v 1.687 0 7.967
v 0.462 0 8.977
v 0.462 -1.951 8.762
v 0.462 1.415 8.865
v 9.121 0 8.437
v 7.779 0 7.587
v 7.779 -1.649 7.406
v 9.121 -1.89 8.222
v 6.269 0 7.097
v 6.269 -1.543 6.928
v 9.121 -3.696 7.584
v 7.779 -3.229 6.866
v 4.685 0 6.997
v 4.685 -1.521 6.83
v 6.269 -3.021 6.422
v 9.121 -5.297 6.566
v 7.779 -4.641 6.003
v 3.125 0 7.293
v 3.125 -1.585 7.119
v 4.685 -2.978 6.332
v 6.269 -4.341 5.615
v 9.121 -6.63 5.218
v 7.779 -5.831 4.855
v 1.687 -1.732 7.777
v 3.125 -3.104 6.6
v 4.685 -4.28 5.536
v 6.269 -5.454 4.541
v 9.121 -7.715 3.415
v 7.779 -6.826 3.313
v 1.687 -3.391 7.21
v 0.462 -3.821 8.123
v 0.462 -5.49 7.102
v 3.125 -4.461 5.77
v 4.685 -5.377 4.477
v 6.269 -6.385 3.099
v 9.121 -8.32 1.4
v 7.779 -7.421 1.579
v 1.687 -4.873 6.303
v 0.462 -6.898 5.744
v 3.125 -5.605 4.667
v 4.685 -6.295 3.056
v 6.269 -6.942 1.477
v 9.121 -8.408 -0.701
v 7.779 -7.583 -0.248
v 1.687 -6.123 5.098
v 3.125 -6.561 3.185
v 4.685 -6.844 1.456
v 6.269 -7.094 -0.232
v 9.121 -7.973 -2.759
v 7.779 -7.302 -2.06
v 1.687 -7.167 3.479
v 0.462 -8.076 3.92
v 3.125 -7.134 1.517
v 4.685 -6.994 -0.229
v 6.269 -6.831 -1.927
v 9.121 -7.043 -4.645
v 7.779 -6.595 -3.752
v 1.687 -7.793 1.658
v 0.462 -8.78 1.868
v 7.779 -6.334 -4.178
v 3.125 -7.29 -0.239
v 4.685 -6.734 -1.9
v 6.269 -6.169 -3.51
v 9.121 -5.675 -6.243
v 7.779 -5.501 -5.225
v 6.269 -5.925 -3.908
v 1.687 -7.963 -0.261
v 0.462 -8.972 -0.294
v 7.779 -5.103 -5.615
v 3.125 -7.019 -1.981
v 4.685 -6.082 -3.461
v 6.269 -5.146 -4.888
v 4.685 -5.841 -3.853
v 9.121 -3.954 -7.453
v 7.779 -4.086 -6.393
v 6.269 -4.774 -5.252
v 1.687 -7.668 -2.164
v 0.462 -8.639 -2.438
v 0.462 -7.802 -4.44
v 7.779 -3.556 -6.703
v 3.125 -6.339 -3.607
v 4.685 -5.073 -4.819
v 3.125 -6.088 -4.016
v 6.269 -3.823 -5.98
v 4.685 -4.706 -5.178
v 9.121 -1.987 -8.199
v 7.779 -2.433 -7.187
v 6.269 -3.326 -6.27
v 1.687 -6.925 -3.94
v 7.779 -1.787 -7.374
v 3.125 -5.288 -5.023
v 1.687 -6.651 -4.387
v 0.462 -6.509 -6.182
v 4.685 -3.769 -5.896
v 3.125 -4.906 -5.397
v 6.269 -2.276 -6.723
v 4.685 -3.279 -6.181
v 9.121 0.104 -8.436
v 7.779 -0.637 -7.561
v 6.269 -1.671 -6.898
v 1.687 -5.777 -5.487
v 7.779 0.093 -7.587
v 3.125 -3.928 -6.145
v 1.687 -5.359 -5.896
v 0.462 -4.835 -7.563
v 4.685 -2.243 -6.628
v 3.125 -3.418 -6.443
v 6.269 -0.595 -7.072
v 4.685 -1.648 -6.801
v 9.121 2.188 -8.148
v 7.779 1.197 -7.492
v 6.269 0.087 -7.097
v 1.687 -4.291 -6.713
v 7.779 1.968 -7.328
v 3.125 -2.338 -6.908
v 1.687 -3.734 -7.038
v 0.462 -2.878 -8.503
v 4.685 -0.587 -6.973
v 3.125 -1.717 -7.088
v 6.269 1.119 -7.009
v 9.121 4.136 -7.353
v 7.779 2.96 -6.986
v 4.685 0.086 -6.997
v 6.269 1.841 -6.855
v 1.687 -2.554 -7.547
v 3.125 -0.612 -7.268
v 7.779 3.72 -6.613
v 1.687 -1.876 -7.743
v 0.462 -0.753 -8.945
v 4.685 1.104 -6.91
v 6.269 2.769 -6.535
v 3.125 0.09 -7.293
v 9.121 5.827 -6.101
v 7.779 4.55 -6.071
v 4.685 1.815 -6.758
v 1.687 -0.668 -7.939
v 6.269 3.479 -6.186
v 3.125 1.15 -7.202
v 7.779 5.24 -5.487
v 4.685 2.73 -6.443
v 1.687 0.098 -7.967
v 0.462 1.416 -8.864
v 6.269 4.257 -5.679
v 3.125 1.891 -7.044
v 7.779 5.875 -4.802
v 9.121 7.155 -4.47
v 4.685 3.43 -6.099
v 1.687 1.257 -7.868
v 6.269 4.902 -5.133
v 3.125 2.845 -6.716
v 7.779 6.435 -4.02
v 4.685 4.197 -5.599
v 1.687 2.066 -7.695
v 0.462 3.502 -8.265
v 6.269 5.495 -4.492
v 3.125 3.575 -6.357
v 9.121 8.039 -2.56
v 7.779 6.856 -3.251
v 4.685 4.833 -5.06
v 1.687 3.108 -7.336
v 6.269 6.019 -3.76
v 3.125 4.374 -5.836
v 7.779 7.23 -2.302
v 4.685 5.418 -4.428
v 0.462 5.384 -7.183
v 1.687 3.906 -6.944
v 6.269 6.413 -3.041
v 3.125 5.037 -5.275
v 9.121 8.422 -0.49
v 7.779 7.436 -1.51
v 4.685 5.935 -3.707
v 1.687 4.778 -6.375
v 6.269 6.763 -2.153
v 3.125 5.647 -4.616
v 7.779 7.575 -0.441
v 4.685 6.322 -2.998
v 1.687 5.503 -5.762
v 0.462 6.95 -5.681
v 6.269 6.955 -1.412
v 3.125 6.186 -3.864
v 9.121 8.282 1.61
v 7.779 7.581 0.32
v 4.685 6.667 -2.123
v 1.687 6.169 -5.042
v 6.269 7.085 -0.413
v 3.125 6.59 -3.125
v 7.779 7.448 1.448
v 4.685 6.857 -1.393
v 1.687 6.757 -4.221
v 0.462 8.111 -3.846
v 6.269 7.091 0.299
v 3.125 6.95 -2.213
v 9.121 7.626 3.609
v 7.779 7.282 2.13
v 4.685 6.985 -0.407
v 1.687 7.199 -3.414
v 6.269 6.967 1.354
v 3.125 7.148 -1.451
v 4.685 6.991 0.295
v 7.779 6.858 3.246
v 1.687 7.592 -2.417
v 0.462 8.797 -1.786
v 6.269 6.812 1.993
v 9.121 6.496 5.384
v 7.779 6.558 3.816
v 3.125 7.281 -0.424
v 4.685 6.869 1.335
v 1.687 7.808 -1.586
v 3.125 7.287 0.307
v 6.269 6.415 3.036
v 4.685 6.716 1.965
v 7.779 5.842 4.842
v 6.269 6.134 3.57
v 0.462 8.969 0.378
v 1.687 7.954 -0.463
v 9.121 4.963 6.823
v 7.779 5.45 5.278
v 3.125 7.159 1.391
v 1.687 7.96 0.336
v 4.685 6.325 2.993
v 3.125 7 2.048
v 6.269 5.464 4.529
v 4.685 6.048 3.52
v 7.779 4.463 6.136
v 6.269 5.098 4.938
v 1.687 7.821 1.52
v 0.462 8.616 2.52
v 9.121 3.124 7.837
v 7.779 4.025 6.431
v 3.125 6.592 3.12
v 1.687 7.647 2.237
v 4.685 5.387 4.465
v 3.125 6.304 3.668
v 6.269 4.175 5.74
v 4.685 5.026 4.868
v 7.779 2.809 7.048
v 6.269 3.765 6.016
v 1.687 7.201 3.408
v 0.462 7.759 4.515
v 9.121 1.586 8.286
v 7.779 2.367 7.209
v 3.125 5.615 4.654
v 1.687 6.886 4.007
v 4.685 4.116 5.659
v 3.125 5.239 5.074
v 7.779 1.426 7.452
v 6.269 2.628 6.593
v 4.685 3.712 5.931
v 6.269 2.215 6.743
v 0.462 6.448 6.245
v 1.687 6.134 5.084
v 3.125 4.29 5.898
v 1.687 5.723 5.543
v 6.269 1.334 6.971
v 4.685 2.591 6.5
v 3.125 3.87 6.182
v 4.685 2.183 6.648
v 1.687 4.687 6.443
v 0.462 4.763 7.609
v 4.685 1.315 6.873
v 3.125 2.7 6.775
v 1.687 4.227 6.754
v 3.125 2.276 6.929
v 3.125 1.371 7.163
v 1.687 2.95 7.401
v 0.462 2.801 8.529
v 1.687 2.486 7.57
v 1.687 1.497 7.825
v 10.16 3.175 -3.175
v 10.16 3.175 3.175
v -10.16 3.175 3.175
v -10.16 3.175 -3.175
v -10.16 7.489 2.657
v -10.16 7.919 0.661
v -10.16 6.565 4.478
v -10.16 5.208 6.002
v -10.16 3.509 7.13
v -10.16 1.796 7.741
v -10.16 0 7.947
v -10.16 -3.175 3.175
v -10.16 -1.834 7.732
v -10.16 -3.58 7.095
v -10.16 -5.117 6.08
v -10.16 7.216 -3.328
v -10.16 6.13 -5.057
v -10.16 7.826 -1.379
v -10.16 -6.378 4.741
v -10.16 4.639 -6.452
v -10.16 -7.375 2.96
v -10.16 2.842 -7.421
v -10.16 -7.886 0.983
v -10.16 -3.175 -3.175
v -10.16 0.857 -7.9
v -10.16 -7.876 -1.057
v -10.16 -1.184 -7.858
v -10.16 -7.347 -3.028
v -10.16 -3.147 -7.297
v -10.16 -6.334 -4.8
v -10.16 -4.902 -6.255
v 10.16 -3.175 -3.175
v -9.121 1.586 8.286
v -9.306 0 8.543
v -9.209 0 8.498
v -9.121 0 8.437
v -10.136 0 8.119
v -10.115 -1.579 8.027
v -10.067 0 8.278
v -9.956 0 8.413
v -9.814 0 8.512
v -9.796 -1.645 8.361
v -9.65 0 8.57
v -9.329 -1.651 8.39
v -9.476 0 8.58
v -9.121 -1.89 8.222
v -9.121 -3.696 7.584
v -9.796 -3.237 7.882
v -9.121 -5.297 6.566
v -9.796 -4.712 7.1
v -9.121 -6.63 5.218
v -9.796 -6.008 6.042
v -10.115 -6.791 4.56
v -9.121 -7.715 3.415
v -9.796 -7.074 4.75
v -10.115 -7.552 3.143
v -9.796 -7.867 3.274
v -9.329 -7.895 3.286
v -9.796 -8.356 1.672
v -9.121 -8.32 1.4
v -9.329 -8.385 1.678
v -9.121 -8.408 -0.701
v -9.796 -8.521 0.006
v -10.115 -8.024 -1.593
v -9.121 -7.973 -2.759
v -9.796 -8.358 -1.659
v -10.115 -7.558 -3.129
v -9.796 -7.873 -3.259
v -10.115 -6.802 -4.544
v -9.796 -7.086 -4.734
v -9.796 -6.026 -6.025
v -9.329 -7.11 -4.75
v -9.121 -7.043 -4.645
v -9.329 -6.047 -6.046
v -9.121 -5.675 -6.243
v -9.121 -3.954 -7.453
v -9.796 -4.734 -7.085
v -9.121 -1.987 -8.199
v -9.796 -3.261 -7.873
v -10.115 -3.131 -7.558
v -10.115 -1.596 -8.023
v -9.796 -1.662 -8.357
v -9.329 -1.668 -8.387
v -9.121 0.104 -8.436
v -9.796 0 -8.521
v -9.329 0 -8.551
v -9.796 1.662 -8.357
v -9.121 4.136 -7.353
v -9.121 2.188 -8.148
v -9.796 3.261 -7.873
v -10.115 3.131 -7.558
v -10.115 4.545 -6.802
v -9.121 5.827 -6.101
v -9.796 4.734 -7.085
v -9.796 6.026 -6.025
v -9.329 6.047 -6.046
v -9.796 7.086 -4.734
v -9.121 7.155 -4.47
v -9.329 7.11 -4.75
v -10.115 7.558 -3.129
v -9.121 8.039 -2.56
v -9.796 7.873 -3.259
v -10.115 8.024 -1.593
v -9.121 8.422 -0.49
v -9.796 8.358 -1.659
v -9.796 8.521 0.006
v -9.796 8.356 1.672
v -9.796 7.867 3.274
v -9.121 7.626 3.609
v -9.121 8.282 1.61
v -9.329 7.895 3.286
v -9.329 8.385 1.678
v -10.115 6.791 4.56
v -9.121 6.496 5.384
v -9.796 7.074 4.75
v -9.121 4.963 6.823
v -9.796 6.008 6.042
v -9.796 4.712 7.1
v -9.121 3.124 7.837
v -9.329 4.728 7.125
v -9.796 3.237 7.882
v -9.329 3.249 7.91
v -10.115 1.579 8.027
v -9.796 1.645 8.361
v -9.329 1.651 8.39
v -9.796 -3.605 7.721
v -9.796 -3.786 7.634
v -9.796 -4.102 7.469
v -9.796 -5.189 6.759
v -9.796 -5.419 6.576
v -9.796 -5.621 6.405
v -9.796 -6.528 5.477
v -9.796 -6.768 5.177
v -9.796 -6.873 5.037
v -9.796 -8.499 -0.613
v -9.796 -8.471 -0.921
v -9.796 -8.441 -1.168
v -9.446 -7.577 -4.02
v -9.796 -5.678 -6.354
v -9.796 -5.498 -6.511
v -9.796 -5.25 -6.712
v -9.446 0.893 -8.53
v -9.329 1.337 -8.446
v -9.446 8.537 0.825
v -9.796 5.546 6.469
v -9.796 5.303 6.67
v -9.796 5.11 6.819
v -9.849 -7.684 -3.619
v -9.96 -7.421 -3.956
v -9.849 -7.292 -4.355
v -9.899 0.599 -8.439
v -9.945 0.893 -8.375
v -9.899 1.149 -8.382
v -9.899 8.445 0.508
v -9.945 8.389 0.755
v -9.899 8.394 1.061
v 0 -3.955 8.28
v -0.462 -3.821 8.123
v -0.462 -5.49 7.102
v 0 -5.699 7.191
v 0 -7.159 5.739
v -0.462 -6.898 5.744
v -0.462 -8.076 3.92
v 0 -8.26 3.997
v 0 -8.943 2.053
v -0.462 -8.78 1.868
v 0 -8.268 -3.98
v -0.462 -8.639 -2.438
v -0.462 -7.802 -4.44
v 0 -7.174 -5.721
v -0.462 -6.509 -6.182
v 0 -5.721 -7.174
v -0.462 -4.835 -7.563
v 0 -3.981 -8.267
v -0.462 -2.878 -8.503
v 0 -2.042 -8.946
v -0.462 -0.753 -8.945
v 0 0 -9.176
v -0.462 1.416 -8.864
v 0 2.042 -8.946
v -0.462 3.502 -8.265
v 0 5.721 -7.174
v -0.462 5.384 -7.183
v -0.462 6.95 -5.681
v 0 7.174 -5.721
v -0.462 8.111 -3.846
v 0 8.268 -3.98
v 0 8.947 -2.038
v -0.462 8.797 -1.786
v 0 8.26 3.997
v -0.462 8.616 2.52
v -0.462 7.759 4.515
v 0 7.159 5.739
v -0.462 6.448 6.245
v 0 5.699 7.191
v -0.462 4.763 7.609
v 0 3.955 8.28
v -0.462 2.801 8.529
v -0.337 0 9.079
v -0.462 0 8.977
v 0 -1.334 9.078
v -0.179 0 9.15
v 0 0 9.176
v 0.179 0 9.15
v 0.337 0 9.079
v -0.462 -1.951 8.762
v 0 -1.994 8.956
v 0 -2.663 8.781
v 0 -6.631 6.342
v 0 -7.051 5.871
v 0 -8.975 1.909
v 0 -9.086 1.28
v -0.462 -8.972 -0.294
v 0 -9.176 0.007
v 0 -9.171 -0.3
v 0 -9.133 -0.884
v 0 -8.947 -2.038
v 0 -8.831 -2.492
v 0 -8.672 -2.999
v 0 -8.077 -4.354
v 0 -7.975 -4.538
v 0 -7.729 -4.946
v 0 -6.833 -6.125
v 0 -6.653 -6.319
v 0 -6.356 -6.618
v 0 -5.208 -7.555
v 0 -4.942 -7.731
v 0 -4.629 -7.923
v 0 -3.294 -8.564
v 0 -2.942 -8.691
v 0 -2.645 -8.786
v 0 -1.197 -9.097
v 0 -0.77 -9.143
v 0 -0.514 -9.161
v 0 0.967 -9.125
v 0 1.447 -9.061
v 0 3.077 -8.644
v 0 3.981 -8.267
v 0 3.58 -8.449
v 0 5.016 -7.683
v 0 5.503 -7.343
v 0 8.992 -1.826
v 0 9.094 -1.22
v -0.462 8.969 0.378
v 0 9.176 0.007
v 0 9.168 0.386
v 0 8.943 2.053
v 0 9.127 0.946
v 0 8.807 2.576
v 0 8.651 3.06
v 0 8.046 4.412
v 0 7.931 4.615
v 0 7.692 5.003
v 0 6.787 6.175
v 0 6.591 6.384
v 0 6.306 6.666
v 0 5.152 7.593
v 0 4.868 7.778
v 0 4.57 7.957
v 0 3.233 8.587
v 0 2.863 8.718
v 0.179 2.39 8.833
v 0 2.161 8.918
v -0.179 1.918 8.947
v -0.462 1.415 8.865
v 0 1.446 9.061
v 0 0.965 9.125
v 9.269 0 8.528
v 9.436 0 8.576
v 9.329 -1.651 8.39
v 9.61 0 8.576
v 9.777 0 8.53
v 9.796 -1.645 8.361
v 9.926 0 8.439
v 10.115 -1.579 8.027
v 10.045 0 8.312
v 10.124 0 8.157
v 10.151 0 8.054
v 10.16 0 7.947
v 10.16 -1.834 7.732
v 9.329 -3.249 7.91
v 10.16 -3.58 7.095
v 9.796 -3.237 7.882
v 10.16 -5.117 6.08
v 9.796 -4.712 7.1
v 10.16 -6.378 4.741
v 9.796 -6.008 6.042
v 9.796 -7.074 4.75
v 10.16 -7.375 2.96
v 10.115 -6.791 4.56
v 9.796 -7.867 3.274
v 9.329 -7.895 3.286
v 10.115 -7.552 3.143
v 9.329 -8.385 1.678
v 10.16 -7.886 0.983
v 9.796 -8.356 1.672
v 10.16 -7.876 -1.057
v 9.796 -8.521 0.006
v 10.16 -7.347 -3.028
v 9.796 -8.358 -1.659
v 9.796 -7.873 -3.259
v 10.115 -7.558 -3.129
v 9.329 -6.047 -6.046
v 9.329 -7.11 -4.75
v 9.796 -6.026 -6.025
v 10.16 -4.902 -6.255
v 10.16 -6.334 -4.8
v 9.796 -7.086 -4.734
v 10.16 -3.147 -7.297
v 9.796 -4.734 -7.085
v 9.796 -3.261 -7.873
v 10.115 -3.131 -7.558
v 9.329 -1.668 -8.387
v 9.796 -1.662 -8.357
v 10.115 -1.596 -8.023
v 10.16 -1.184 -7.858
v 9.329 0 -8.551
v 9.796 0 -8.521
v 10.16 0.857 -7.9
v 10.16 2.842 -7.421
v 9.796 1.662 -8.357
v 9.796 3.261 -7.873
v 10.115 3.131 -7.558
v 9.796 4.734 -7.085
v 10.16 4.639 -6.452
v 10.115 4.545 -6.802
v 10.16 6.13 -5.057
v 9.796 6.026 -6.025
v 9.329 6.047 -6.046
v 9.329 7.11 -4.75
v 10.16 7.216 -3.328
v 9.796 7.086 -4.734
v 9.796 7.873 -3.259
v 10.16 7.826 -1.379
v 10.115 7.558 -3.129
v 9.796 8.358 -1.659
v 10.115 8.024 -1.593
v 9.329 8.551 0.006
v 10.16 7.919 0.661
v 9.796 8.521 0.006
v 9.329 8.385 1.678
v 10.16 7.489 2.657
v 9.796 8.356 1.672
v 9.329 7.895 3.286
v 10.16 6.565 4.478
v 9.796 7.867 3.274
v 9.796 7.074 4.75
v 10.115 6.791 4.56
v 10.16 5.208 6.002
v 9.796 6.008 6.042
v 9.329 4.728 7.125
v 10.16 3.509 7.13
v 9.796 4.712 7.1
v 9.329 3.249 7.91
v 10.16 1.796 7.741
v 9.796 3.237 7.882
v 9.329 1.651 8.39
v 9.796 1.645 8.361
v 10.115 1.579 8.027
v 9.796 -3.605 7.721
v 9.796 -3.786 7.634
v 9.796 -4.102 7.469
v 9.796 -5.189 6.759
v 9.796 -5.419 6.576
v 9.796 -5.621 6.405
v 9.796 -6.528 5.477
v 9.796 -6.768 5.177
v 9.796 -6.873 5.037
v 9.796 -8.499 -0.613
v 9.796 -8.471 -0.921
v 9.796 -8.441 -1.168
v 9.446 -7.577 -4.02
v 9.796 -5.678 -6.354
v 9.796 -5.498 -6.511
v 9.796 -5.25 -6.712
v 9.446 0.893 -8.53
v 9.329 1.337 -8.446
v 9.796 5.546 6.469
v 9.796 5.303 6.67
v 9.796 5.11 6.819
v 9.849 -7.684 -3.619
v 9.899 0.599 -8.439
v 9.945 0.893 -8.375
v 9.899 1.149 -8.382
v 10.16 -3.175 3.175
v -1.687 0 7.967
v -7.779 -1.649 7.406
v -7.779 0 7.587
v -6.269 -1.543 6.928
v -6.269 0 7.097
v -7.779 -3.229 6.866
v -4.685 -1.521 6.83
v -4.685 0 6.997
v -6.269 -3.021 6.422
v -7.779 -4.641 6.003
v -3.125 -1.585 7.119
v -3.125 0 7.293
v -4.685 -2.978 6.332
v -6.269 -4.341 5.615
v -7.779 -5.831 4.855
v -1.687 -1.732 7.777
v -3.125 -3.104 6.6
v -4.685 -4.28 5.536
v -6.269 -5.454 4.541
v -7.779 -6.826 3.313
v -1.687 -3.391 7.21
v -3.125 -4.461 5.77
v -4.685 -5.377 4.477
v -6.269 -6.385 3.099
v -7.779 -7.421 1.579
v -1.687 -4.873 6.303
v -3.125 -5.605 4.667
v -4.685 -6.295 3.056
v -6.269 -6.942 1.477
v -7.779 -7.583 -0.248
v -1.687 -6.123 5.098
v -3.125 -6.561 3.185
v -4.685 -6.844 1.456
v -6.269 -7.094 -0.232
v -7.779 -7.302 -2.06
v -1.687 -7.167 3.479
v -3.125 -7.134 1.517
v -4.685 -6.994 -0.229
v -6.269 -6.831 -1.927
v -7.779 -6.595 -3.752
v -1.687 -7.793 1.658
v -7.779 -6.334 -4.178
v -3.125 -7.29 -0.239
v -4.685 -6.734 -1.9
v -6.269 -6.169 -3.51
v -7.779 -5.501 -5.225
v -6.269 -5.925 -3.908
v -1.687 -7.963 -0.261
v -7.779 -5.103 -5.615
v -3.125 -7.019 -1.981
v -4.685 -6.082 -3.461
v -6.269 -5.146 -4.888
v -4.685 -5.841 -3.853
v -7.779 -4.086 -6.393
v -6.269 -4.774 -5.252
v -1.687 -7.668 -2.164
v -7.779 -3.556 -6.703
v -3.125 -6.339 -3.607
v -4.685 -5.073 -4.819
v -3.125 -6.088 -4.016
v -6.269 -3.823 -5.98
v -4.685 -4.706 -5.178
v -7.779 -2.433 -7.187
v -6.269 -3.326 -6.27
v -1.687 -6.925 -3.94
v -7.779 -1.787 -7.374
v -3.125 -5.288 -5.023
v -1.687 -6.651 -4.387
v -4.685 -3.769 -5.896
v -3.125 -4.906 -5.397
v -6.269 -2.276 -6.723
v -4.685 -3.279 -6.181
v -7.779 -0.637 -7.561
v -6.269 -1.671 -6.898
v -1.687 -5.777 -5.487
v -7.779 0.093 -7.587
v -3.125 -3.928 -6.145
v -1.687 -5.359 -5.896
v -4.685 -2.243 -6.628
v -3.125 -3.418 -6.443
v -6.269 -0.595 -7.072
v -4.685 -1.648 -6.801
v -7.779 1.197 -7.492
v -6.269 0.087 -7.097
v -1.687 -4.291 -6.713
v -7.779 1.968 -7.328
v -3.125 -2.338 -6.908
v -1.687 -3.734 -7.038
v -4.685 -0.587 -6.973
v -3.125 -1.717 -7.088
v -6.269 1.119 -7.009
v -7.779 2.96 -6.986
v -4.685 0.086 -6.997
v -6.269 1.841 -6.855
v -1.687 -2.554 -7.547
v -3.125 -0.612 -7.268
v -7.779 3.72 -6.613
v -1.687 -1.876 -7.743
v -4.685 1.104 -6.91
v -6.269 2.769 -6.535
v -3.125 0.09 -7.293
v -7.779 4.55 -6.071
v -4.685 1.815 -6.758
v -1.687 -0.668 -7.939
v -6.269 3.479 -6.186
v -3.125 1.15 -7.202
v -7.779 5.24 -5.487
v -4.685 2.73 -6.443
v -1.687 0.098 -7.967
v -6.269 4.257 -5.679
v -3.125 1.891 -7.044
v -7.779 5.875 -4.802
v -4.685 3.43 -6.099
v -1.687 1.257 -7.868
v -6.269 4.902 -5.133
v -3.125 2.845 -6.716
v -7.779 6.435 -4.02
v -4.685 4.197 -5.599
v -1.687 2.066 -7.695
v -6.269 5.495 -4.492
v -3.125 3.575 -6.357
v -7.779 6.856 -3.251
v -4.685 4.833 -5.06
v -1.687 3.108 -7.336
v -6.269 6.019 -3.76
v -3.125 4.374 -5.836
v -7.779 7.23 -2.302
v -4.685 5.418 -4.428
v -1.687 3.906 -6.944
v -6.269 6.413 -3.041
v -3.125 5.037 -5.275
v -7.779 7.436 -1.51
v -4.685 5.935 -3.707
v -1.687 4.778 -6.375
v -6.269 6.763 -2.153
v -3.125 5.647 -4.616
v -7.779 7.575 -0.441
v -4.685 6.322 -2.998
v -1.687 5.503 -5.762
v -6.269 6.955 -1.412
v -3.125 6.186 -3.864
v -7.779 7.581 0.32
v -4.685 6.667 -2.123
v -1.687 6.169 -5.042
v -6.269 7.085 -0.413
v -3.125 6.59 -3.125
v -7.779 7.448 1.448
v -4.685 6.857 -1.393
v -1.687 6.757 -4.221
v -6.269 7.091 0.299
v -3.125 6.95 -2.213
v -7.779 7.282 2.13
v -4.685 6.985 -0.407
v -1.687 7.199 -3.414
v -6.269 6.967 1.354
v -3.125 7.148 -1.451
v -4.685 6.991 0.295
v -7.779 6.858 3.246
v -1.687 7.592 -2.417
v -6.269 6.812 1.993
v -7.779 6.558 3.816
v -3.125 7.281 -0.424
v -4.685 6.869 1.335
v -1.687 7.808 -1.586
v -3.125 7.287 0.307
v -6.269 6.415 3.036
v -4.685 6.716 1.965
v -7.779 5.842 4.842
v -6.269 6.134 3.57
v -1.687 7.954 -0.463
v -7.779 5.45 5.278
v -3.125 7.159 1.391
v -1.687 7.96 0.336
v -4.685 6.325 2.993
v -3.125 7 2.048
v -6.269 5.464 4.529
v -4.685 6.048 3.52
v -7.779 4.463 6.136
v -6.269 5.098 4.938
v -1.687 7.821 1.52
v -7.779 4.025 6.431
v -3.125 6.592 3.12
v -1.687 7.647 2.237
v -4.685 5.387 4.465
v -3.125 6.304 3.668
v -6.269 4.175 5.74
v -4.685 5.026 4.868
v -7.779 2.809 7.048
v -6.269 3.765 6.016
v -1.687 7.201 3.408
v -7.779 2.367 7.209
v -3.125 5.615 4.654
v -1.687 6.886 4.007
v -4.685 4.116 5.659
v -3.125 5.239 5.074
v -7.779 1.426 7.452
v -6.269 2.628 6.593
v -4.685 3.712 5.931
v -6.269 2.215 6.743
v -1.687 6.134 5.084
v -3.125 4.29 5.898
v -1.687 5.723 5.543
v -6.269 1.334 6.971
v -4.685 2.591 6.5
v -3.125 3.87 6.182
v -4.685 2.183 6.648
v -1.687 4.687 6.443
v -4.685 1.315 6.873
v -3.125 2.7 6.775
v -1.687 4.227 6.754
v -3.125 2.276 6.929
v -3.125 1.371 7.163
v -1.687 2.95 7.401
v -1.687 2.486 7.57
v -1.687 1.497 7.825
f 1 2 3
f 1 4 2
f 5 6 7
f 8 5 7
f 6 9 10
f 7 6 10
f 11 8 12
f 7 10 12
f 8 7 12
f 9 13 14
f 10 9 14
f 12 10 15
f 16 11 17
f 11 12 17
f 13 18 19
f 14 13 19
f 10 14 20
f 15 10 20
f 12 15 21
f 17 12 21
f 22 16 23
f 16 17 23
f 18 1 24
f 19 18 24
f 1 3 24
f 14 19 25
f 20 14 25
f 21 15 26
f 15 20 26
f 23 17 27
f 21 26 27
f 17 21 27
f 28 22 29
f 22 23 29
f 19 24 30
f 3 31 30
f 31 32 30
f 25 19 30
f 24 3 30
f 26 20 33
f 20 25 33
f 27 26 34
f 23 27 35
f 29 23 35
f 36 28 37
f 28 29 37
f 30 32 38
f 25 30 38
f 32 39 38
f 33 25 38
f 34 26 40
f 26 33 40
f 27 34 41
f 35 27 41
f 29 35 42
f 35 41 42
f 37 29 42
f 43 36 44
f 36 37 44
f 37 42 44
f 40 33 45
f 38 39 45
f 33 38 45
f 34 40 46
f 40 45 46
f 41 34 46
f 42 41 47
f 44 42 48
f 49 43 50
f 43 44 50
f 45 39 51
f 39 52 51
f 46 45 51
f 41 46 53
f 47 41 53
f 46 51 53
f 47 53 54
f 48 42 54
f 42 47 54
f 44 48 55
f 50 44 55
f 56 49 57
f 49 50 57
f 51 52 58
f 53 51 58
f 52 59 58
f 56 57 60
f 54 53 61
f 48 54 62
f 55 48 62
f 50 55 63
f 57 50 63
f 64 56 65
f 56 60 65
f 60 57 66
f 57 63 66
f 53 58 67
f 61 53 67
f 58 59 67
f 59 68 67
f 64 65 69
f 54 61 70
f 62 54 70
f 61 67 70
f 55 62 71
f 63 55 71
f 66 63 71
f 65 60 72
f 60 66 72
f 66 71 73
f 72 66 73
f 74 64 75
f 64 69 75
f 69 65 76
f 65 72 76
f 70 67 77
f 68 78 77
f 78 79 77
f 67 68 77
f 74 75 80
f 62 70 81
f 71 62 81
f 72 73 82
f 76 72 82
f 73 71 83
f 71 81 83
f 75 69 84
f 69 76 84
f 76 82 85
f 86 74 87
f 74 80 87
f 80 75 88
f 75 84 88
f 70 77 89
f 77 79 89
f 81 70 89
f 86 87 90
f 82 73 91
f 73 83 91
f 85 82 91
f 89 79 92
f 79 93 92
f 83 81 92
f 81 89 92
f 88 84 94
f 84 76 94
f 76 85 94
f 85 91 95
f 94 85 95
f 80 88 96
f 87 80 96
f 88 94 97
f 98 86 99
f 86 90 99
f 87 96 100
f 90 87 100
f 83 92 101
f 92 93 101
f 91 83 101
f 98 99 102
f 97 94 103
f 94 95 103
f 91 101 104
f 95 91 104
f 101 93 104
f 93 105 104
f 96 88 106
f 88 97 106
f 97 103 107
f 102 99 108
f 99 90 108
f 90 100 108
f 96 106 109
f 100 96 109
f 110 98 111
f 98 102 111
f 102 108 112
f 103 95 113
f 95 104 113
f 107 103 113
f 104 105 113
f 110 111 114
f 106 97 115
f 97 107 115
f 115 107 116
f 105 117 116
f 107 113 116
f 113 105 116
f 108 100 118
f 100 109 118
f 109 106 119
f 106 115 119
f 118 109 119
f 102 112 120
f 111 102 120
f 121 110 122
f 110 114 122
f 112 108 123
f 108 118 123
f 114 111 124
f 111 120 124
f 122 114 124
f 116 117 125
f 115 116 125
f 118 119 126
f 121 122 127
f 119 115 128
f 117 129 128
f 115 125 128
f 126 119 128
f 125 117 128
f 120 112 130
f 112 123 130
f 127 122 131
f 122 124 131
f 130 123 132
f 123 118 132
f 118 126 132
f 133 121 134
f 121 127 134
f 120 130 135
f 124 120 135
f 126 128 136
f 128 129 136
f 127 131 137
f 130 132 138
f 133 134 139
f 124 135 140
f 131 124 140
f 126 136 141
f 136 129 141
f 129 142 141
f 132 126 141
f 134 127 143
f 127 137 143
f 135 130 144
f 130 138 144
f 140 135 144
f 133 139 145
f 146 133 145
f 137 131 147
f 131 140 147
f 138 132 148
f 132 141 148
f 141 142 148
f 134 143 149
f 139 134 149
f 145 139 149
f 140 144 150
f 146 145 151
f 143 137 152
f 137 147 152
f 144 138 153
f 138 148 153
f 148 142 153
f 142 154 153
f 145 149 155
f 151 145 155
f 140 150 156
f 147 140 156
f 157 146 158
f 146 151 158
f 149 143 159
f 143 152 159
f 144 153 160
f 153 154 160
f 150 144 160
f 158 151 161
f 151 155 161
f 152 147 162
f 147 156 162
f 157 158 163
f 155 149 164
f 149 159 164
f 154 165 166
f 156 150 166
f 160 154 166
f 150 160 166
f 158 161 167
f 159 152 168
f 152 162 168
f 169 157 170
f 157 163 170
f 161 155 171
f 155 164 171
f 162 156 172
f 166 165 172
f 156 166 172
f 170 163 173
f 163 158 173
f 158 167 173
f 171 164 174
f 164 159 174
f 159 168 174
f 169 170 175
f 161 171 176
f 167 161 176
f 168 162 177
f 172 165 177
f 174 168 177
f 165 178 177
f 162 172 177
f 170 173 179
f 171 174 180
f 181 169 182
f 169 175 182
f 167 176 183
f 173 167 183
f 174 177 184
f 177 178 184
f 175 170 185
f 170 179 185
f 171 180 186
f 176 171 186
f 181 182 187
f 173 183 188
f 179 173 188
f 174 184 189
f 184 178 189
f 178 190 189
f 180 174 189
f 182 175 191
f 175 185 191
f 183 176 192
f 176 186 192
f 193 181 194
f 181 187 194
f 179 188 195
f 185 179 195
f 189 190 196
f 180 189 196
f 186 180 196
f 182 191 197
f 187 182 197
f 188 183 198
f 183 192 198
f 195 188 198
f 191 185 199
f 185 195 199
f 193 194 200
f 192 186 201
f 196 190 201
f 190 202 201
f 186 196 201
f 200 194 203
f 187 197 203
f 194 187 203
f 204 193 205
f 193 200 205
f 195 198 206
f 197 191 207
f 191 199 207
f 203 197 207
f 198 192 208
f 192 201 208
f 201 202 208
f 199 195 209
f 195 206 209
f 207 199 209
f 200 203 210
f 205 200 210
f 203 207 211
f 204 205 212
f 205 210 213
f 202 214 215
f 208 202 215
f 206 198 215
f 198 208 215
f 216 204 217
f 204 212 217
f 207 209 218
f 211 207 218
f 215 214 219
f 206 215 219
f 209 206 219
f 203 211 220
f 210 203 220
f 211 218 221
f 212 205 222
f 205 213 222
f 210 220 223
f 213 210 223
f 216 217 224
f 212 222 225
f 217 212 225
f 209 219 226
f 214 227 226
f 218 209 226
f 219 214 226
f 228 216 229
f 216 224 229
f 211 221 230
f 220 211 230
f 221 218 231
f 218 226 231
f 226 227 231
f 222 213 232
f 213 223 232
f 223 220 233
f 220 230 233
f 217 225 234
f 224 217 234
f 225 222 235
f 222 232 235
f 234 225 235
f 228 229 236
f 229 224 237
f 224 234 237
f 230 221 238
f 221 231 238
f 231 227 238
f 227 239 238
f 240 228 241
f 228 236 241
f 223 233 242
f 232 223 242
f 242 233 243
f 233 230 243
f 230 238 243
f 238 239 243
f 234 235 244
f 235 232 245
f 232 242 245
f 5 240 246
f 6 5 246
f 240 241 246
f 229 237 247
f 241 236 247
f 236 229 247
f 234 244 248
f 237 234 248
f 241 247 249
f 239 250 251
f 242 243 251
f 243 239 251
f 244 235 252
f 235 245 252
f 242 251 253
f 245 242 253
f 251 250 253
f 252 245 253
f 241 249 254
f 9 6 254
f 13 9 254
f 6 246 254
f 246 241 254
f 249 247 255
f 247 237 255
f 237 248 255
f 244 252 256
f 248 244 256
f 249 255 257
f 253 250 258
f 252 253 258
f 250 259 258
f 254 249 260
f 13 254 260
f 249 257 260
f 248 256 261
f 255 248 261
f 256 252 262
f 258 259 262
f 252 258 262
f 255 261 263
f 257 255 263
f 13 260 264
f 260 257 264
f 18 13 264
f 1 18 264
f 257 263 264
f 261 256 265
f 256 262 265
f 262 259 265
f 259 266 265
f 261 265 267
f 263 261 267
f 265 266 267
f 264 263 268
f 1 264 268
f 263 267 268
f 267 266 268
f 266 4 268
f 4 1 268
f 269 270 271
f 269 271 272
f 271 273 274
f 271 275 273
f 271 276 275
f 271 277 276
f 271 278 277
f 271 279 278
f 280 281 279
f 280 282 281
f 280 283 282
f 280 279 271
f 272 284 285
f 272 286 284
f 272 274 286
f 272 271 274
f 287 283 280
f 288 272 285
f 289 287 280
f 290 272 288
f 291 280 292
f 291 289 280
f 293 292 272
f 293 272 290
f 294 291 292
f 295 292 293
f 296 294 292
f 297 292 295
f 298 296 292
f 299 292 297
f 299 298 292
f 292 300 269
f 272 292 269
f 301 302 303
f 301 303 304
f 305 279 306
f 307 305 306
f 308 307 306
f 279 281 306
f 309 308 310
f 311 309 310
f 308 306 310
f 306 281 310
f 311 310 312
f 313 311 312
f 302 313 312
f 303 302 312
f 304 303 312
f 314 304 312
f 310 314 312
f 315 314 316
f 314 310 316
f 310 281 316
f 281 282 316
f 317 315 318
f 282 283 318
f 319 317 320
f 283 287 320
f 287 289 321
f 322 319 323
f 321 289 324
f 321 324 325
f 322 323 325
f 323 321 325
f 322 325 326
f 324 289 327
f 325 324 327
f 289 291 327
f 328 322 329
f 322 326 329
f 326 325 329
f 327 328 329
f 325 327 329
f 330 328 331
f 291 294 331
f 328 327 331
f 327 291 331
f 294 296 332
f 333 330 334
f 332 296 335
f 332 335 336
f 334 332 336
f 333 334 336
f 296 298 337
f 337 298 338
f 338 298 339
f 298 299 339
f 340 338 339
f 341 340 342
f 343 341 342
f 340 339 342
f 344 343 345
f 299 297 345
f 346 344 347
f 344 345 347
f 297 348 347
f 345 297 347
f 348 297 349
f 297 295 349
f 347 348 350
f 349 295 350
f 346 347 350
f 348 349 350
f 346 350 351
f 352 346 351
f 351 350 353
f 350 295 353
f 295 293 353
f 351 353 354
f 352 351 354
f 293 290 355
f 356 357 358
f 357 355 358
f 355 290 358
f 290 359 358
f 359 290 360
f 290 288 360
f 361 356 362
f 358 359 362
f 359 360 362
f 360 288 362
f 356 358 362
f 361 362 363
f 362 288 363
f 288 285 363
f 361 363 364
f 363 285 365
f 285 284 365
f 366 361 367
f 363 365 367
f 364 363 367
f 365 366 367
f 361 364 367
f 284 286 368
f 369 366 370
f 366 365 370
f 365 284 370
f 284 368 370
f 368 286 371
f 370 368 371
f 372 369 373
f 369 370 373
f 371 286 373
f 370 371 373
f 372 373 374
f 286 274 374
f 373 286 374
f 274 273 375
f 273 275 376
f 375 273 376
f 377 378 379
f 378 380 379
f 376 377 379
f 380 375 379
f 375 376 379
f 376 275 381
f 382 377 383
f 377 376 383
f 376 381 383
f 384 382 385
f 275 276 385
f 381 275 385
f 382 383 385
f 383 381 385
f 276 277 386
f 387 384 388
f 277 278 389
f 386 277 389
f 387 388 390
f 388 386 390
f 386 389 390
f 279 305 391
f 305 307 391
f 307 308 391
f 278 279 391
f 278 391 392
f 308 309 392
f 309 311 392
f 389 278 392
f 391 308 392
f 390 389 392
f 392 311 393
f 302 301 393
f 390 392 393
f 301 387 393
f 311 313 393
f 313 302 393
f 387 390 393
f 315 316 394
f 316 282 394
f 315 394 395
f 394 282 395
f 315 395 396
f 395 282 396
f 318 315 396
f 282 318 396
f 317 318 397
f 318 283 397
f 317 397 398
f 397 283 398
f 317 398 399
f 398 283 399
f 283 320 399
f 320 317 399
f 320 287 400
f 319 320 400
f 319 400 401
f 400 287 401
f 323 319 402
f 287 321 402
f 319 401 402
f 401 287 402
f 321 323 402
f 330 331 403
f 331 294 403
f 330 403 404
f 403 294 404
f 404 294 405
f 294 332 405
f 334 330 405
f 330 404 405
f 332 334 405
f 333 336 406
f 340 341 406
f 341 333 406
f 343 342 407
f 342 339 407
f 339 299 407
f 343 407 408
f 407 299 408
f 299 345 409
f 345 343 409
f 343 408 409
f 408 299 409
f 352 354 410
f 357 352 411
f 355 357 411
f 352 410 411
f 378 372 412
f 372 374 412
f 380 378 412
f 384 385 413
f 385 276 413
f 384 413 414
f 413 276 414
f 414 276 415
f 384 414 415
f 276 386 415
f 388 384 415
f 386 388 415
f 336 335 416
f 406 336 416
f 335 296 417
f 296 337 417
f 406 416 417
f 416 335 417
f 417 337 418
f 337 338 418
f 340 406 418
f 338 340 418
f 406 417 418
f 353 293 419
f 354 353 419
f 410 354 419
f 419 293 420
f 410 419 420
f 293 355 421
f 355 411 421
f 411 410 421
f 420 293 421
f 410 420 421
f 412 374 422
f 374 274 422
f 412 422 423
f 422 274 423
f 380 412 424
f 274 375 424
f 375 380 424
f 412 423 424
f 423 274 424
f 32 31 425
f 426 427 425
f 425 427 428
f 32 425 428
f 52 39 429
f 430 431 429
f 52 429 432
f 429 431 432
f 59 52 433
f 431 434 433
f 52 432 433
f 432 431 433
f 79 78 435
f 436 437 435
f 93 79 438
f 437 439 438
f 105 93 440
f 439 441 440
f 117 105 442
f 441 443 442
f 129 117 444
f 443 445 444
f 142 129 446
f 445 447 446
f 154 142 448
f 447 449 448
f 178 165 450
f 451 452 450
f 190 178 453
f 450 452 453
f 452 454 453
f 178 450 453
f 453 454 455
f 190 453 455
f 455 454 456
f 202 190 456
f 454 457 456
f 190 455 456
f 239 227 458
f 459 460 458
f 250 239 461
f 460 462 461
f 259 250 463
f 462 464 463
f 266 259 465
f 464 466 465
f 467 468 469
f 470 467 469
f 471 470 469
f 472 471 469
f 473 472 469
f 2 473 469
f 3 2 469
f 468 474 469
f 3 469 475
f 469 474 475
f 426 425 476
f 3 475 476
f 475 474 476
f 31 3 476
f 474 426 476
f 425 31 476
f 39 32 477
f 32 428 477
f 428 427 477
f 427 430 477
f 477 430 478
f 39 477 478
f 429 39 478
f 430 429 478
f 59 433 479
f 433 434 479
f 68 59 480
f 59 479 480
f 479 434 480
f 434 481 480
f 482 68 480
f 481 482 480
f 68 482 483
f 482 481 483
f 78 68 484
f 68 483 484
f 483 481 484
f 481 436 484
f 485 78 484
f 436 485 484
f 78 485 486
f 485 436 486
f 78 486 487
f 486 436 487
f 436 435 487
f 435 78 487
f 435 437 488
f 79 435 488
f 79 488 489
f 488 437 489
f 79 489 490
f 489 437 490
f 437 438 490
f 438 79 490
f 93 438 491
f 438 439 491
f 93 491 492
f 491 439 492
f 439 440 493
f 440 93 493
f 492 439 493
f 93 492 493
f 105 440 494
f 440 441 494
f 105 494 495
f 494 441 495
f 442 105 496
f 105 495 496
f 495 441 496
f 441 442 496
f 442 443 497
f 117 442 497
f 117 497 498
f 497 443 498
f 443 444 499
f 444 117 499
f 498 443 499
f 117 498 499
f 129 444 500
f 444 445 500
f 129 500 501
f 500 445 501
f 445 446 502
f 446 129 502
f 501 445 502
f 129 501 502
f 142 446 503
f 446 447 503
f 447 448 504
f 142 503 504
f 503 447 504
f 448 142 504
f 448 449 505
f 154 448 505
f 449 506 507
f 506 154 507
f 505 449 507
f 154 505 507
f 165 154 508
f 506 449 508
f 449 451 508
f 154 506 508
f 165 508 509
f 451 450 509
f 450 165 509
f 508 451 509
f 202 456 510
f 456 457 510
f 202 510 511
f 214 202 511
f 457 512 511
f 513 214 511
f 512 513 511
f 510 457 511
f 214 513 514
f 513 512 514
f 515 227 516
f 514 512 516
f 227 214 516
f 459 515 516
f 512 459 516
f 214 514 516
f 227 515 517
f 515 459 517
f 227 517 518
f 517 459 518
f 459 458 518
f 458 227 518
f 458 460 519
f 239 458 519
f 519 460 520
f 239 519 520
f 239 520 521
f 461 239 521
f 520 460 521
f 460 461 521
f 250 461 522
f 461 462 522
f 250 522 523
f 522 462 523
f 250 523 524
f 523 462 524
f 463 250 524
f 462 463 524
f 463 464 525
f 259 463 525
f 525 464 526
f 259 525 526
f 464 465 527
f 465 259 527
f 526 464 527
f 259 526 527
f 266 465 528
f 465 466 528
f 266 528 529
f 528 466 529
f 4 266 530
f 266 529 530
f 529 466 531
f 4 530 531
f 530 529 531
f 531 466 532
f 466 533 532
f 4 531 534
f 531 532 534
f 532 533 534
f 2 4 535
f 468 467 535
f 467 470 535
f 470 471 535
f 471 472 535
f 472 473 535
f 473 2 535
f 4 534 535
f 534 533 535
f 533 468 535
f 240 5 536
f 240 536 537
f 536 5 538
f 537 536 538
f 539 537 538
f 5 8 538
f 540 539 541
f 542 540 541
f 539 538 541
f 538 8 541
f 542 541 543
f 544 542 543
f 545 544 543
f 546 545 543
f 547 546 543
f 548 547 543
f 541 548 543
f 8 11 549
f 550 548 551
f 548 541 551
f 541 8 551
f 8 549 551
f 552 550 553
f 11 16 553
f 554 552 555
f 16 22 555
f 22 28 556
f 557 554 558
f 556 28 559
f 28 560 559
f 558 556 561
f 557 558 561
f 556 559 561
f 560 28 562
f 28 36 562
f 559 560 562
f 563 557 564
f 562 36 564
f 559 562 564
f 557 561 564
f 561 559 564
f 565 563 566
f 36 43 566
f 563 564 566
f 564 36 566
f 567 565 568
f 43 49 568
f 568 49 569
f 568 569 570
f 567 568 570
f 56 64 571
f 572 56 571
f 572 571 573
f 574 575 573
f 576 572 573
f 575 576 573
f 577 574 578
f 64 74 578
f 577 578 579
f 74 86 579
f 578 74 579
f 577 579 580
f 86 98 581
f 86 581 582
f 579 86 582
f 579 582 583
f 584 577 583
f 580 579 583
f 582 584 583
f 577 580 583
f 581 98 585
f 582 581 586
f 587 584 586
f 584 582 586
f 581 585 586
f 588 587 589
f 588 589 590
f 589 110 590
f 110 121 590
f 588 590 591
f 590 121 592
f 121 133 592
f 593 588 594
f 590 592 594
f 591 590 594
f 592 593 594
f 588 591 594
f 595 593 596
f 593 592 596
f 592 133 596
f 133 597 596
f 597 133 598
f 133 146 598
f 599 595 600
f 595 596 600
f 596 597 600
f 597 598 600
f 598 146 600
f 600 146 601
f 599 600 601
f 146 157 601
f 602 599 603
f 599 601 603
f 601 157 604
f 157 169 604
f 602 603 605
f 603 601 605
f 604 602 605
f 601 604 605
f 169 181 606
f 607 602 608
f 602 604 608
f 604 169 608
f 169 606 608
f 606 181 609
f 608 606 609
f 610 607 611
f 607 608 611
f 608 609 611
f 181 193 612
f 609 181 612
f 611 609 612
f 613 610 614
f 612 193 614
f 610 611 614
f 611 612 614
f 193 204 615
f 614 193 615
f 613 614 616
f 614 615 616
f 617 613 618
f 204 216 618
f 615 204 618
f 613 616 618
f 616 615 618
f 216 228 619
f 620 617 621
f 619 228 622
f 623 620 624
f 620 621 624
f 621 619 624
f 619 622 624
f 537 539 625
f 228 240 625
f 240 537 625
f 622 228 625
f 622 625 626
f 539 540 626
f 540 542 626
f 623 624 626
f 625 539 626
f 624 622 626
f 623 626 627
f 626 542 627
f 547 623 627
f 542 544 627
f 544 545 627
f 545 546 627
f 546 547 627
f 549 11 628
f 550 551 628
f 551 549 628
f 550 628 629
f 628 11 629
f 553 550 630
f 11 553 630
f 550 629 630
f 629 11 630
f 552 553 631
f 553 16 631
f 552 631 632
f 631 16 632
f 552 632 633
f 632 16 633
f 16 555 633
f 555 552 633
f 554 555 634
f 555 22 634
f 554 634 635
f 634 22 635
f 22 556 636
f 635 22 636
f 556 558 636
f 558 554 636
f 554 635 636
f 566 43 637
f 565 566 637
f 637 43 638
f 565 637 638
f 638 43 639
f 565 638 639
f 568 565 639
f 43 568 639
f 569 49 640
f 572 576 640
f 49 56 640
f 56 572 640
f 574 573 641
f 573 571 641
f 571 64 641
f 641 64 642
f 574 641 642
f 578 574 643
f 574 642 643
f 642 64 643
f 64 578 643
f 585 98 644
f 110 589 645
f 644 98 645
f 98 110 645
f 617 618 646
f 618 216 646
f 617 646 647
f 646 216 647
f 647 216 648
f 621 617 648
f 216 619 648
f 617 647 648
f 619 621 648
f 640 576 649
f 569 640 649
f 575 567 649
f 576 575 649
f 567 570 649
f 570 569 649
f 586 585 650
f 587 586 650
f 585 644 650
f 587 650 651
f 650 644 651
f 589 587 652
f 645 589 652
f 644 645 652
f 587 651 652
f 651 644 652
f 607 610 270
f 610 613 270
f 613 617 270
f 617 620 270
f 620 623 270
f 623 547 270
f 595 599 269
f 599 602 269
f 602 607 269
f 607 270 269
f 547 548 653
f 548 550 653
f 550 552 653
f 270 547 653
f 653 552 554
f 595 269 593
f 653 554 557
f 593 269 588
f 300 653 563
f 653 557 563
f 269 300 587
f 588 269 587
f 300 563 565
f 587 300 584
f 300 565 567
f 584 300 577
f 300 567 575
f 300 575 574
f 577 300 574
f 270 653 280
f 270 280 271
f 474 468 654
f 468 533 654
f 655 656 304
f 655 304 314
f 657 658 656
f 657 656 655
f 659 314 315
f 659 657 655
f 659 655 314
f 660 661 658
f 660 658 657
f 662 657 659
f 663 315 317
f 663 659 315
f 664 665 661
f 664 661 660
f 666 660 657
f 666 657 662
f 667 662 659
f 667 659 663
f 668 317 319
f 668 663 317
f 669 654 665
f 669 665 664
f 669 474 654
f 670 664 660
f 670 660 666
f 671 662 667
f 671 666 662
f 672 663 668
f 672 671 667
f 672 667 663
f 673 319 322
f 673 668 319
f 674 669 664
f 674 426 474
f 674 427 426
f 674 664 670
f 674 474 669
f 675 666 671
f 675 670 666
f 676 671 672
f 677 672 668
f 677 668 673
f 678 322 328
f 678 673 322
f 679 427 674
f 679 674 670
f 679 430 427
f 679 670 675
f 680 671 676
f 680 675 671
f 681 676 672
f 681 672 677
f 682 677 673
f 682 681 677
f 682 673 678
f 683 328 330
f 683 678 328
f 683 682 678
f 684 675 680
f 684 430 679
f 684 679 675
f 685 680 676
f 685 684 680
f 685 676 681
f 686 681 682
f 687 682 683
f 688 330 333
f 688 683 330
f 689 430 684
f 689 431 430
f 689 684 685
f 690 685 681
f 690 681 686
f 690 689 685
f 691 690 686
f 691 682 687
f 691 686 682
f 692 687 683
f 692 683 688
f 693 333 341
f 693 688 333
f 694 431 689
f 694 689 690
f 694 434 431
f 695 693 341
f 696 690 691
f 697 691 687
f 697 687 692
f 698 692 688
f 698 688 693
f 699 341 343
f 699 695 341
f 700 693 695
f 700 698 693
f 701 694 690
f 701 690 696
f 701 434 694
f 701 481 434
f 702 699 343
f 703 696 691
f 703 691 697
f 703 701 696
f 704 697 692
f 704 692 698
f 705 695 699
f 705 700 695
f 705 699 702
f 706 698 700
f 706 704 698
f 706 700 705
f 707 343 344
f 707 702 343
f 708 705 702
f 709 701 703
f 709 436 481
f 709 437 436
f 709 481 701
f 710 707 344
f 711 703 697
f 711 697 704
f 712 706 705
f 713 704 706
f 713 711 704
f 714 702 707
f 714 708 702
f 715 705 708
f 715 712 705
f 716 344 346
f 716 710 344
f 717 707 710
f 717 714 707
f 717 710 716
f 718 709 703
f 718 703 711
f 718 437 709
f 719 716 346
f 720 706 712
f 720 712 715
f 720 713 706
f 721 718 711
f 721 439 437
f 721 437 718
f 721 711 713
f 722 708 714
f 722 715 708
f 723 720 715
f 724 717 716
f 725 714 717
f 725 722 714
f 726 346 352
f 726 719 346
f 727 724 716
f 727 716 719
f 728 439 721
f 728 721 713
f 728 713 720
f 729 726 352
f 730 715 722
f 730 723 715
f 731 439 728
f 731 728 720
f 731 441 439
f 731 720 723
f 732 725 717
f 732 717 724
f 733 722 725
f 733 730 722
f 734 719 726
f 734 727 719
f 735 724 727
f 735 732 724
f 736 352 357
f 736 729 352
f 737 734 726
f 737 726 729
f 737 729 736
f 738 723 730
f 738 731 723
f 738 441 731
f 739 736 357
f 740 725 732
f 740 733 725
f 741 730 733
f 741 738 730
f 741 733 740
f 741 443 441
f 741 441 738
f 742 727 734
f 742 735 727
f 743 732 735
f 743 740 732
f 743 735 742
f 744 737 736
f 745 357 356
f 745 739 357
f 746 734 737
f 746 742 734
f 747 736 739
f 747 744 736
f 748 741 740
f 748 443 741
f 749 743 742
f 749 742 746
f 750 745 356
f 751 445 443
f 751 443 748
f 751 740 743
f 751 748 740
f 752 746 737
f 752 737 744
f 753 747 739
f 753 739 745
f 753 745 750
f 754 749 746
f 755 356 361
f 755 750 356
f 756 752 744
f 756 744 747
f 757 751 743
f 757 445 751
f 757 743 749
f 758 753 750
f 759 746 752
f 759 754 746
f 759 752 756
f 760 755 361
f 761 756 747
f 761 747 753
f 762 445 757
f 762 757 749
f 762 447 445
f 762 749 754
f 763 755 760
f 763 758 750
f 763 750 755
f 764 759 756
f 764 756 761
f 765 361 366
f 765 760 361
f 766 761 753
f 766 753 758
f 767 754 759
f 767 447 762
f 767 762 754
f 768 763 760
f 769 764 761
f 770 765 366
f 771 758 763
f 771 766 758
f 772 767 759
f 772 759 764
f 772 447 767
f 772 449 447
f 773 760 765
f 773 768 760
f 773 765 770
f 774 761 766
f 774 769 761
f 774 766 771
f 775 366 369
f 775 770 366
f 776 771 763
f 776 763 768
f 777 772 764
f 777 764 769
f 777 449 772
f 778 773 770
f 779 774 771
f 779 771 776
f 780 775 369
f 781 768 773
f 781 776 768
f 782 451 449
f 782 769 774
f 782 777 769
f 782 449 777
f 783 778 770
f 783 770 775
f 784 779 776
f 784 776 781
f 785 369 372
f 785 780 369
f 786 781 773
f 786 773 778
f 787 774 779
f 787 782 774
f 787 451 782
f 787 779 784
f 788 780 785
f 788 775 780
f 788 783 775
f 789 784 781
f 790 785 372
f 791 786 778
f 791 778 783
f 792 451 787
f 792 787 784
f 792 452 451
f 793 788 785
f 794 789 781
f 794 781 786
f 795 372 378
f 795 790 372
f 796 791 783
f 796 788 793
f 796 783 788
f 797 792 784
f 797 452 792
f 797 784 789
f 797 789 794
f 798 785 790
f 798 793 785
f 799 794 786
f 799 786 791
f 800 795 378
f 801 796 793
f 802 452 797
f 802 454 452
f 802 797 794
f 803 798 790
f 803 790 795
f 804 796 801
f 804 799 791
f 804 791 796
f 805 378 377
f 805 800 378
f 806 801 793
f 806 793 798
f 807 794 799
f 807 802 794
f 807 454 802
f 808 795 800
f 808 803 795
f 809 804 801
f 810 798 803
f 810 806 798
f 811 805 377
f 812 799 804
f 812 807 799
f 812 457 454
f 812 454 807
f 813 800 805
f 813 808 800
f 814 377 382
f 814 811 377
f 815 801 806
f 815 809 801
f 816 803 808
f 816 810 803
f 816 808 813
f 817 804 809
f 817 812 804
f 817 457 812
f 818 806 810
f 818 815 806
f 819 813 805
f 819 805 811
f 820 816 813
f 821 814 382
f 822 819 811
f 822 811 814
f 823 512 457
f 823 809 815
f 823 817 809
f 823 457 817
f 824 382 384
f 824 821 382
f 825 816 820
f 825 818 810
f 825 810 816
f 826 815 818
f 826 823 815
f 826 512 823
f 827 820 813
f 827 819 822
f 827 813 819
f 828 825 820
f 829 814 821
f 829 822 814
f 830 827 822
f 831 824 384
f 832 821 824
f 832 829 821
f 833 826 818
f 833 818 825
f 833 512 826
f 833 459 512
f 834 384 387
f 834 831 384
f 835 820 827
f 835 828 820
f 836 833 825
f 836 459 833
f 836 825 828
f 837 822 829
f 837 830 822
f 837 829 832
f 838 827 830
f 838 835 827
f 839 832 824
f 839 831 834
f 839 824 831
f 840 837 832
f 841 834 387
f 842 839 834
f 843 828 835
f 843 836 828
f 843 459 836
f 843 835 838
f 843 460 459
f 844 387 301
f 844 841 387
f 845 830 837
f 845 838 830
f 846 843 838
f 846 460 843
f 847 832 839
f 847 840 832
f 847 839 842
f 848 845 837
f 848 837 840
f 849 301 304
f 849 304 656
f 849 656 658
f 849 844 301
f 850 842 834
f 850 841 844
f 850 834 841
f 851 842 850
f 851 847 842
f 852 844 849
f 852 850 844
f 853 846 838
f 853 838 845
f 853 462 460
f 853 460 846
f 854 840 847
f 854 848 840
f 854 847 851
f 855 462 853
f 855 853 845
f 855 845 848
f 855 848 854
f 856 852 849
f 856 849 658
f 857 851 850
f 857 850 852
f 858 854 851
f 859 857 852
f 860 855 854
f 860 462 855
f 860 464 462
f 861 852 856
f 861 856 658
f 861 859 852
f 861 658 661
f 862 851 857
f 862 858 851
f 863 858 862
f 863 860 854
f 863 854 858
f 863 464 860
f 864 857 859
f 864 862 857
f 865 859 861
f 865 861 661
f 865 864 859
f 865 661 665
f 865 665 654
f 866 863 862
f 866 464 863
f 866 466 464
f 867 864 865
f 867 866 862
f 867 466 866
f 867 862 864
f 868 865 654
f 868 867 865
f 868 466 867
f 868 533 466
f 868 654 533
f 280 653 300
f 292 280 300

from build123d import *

# Parameters (mm, degrees)
SKETCH3_W          = 6.35
SKETCH3_H          = 6.35
CUT_EXTRUDE1_DEPTH = 17.872369425
FILLET1_R          = 0.635


with BuildPart() as part:
    # Sketch2 → Revolve1 (revolve)
    with BuildSketch(Plane.XY, mode=Mode.PRIVATE) as revolve1_sk:
        with BuildLine():
            Line((0, 2.286), (10.16, 2.286))
            Line((10.16, 2.286), (10.16, 9.525))
            ThreePointArc((10.16, 9.525), (5.08, 6.985), (0, 9.525))
            Line((0, 9.525), (0, 2.286))
        make_face()
    revolve1 = revolve(revolve1_sk.sketch.rotate(Axis((0, 0, 0), (1, 0, 0)), 90), axis=Axis((0, 0, 0), (1, 0, 0)))

    # Sketch3 → Cut-Extrude1 (cut, through all)
    with BuildSketch(Plane(origin=(10.16, 0, 0), x_dir=(0, 0, -1), z_dir=(1, 0, 0))):
        Rectangle(SKETCH3_W, SKETCH3_H)
    cut_extrude1 = extrude(amount=-CUT_EXTRUDE1_DEPTH, mode=Mode.SUBTRACT)

    # Mirror1: Revolve1, Cut-Extrude1 across plane
    add(revolve1.mirror(Plane(origin=(0, 2.286, 0), x_dir=(0, 0, 1), z_dir=(1, 0, 0))))
    add(cut_extrude1.mirror(Plane(origin=(0, 2.286, 0), x_dir=(0, 0, 1), z_dir=(1, 0, 0))), mode=Mode.SUBTRACT)

    # Fillet1
    fillet1_edges = [part.edges().sort_by_distance(p)[0] for p in [
        (-10.16, 0, -9.525),
        (0, 0, -9.525),
        (10.16, 0, -9.525),
    ]]
    fillet(fillet1_edges, radius=FILLET1_R)


solid = part.part
